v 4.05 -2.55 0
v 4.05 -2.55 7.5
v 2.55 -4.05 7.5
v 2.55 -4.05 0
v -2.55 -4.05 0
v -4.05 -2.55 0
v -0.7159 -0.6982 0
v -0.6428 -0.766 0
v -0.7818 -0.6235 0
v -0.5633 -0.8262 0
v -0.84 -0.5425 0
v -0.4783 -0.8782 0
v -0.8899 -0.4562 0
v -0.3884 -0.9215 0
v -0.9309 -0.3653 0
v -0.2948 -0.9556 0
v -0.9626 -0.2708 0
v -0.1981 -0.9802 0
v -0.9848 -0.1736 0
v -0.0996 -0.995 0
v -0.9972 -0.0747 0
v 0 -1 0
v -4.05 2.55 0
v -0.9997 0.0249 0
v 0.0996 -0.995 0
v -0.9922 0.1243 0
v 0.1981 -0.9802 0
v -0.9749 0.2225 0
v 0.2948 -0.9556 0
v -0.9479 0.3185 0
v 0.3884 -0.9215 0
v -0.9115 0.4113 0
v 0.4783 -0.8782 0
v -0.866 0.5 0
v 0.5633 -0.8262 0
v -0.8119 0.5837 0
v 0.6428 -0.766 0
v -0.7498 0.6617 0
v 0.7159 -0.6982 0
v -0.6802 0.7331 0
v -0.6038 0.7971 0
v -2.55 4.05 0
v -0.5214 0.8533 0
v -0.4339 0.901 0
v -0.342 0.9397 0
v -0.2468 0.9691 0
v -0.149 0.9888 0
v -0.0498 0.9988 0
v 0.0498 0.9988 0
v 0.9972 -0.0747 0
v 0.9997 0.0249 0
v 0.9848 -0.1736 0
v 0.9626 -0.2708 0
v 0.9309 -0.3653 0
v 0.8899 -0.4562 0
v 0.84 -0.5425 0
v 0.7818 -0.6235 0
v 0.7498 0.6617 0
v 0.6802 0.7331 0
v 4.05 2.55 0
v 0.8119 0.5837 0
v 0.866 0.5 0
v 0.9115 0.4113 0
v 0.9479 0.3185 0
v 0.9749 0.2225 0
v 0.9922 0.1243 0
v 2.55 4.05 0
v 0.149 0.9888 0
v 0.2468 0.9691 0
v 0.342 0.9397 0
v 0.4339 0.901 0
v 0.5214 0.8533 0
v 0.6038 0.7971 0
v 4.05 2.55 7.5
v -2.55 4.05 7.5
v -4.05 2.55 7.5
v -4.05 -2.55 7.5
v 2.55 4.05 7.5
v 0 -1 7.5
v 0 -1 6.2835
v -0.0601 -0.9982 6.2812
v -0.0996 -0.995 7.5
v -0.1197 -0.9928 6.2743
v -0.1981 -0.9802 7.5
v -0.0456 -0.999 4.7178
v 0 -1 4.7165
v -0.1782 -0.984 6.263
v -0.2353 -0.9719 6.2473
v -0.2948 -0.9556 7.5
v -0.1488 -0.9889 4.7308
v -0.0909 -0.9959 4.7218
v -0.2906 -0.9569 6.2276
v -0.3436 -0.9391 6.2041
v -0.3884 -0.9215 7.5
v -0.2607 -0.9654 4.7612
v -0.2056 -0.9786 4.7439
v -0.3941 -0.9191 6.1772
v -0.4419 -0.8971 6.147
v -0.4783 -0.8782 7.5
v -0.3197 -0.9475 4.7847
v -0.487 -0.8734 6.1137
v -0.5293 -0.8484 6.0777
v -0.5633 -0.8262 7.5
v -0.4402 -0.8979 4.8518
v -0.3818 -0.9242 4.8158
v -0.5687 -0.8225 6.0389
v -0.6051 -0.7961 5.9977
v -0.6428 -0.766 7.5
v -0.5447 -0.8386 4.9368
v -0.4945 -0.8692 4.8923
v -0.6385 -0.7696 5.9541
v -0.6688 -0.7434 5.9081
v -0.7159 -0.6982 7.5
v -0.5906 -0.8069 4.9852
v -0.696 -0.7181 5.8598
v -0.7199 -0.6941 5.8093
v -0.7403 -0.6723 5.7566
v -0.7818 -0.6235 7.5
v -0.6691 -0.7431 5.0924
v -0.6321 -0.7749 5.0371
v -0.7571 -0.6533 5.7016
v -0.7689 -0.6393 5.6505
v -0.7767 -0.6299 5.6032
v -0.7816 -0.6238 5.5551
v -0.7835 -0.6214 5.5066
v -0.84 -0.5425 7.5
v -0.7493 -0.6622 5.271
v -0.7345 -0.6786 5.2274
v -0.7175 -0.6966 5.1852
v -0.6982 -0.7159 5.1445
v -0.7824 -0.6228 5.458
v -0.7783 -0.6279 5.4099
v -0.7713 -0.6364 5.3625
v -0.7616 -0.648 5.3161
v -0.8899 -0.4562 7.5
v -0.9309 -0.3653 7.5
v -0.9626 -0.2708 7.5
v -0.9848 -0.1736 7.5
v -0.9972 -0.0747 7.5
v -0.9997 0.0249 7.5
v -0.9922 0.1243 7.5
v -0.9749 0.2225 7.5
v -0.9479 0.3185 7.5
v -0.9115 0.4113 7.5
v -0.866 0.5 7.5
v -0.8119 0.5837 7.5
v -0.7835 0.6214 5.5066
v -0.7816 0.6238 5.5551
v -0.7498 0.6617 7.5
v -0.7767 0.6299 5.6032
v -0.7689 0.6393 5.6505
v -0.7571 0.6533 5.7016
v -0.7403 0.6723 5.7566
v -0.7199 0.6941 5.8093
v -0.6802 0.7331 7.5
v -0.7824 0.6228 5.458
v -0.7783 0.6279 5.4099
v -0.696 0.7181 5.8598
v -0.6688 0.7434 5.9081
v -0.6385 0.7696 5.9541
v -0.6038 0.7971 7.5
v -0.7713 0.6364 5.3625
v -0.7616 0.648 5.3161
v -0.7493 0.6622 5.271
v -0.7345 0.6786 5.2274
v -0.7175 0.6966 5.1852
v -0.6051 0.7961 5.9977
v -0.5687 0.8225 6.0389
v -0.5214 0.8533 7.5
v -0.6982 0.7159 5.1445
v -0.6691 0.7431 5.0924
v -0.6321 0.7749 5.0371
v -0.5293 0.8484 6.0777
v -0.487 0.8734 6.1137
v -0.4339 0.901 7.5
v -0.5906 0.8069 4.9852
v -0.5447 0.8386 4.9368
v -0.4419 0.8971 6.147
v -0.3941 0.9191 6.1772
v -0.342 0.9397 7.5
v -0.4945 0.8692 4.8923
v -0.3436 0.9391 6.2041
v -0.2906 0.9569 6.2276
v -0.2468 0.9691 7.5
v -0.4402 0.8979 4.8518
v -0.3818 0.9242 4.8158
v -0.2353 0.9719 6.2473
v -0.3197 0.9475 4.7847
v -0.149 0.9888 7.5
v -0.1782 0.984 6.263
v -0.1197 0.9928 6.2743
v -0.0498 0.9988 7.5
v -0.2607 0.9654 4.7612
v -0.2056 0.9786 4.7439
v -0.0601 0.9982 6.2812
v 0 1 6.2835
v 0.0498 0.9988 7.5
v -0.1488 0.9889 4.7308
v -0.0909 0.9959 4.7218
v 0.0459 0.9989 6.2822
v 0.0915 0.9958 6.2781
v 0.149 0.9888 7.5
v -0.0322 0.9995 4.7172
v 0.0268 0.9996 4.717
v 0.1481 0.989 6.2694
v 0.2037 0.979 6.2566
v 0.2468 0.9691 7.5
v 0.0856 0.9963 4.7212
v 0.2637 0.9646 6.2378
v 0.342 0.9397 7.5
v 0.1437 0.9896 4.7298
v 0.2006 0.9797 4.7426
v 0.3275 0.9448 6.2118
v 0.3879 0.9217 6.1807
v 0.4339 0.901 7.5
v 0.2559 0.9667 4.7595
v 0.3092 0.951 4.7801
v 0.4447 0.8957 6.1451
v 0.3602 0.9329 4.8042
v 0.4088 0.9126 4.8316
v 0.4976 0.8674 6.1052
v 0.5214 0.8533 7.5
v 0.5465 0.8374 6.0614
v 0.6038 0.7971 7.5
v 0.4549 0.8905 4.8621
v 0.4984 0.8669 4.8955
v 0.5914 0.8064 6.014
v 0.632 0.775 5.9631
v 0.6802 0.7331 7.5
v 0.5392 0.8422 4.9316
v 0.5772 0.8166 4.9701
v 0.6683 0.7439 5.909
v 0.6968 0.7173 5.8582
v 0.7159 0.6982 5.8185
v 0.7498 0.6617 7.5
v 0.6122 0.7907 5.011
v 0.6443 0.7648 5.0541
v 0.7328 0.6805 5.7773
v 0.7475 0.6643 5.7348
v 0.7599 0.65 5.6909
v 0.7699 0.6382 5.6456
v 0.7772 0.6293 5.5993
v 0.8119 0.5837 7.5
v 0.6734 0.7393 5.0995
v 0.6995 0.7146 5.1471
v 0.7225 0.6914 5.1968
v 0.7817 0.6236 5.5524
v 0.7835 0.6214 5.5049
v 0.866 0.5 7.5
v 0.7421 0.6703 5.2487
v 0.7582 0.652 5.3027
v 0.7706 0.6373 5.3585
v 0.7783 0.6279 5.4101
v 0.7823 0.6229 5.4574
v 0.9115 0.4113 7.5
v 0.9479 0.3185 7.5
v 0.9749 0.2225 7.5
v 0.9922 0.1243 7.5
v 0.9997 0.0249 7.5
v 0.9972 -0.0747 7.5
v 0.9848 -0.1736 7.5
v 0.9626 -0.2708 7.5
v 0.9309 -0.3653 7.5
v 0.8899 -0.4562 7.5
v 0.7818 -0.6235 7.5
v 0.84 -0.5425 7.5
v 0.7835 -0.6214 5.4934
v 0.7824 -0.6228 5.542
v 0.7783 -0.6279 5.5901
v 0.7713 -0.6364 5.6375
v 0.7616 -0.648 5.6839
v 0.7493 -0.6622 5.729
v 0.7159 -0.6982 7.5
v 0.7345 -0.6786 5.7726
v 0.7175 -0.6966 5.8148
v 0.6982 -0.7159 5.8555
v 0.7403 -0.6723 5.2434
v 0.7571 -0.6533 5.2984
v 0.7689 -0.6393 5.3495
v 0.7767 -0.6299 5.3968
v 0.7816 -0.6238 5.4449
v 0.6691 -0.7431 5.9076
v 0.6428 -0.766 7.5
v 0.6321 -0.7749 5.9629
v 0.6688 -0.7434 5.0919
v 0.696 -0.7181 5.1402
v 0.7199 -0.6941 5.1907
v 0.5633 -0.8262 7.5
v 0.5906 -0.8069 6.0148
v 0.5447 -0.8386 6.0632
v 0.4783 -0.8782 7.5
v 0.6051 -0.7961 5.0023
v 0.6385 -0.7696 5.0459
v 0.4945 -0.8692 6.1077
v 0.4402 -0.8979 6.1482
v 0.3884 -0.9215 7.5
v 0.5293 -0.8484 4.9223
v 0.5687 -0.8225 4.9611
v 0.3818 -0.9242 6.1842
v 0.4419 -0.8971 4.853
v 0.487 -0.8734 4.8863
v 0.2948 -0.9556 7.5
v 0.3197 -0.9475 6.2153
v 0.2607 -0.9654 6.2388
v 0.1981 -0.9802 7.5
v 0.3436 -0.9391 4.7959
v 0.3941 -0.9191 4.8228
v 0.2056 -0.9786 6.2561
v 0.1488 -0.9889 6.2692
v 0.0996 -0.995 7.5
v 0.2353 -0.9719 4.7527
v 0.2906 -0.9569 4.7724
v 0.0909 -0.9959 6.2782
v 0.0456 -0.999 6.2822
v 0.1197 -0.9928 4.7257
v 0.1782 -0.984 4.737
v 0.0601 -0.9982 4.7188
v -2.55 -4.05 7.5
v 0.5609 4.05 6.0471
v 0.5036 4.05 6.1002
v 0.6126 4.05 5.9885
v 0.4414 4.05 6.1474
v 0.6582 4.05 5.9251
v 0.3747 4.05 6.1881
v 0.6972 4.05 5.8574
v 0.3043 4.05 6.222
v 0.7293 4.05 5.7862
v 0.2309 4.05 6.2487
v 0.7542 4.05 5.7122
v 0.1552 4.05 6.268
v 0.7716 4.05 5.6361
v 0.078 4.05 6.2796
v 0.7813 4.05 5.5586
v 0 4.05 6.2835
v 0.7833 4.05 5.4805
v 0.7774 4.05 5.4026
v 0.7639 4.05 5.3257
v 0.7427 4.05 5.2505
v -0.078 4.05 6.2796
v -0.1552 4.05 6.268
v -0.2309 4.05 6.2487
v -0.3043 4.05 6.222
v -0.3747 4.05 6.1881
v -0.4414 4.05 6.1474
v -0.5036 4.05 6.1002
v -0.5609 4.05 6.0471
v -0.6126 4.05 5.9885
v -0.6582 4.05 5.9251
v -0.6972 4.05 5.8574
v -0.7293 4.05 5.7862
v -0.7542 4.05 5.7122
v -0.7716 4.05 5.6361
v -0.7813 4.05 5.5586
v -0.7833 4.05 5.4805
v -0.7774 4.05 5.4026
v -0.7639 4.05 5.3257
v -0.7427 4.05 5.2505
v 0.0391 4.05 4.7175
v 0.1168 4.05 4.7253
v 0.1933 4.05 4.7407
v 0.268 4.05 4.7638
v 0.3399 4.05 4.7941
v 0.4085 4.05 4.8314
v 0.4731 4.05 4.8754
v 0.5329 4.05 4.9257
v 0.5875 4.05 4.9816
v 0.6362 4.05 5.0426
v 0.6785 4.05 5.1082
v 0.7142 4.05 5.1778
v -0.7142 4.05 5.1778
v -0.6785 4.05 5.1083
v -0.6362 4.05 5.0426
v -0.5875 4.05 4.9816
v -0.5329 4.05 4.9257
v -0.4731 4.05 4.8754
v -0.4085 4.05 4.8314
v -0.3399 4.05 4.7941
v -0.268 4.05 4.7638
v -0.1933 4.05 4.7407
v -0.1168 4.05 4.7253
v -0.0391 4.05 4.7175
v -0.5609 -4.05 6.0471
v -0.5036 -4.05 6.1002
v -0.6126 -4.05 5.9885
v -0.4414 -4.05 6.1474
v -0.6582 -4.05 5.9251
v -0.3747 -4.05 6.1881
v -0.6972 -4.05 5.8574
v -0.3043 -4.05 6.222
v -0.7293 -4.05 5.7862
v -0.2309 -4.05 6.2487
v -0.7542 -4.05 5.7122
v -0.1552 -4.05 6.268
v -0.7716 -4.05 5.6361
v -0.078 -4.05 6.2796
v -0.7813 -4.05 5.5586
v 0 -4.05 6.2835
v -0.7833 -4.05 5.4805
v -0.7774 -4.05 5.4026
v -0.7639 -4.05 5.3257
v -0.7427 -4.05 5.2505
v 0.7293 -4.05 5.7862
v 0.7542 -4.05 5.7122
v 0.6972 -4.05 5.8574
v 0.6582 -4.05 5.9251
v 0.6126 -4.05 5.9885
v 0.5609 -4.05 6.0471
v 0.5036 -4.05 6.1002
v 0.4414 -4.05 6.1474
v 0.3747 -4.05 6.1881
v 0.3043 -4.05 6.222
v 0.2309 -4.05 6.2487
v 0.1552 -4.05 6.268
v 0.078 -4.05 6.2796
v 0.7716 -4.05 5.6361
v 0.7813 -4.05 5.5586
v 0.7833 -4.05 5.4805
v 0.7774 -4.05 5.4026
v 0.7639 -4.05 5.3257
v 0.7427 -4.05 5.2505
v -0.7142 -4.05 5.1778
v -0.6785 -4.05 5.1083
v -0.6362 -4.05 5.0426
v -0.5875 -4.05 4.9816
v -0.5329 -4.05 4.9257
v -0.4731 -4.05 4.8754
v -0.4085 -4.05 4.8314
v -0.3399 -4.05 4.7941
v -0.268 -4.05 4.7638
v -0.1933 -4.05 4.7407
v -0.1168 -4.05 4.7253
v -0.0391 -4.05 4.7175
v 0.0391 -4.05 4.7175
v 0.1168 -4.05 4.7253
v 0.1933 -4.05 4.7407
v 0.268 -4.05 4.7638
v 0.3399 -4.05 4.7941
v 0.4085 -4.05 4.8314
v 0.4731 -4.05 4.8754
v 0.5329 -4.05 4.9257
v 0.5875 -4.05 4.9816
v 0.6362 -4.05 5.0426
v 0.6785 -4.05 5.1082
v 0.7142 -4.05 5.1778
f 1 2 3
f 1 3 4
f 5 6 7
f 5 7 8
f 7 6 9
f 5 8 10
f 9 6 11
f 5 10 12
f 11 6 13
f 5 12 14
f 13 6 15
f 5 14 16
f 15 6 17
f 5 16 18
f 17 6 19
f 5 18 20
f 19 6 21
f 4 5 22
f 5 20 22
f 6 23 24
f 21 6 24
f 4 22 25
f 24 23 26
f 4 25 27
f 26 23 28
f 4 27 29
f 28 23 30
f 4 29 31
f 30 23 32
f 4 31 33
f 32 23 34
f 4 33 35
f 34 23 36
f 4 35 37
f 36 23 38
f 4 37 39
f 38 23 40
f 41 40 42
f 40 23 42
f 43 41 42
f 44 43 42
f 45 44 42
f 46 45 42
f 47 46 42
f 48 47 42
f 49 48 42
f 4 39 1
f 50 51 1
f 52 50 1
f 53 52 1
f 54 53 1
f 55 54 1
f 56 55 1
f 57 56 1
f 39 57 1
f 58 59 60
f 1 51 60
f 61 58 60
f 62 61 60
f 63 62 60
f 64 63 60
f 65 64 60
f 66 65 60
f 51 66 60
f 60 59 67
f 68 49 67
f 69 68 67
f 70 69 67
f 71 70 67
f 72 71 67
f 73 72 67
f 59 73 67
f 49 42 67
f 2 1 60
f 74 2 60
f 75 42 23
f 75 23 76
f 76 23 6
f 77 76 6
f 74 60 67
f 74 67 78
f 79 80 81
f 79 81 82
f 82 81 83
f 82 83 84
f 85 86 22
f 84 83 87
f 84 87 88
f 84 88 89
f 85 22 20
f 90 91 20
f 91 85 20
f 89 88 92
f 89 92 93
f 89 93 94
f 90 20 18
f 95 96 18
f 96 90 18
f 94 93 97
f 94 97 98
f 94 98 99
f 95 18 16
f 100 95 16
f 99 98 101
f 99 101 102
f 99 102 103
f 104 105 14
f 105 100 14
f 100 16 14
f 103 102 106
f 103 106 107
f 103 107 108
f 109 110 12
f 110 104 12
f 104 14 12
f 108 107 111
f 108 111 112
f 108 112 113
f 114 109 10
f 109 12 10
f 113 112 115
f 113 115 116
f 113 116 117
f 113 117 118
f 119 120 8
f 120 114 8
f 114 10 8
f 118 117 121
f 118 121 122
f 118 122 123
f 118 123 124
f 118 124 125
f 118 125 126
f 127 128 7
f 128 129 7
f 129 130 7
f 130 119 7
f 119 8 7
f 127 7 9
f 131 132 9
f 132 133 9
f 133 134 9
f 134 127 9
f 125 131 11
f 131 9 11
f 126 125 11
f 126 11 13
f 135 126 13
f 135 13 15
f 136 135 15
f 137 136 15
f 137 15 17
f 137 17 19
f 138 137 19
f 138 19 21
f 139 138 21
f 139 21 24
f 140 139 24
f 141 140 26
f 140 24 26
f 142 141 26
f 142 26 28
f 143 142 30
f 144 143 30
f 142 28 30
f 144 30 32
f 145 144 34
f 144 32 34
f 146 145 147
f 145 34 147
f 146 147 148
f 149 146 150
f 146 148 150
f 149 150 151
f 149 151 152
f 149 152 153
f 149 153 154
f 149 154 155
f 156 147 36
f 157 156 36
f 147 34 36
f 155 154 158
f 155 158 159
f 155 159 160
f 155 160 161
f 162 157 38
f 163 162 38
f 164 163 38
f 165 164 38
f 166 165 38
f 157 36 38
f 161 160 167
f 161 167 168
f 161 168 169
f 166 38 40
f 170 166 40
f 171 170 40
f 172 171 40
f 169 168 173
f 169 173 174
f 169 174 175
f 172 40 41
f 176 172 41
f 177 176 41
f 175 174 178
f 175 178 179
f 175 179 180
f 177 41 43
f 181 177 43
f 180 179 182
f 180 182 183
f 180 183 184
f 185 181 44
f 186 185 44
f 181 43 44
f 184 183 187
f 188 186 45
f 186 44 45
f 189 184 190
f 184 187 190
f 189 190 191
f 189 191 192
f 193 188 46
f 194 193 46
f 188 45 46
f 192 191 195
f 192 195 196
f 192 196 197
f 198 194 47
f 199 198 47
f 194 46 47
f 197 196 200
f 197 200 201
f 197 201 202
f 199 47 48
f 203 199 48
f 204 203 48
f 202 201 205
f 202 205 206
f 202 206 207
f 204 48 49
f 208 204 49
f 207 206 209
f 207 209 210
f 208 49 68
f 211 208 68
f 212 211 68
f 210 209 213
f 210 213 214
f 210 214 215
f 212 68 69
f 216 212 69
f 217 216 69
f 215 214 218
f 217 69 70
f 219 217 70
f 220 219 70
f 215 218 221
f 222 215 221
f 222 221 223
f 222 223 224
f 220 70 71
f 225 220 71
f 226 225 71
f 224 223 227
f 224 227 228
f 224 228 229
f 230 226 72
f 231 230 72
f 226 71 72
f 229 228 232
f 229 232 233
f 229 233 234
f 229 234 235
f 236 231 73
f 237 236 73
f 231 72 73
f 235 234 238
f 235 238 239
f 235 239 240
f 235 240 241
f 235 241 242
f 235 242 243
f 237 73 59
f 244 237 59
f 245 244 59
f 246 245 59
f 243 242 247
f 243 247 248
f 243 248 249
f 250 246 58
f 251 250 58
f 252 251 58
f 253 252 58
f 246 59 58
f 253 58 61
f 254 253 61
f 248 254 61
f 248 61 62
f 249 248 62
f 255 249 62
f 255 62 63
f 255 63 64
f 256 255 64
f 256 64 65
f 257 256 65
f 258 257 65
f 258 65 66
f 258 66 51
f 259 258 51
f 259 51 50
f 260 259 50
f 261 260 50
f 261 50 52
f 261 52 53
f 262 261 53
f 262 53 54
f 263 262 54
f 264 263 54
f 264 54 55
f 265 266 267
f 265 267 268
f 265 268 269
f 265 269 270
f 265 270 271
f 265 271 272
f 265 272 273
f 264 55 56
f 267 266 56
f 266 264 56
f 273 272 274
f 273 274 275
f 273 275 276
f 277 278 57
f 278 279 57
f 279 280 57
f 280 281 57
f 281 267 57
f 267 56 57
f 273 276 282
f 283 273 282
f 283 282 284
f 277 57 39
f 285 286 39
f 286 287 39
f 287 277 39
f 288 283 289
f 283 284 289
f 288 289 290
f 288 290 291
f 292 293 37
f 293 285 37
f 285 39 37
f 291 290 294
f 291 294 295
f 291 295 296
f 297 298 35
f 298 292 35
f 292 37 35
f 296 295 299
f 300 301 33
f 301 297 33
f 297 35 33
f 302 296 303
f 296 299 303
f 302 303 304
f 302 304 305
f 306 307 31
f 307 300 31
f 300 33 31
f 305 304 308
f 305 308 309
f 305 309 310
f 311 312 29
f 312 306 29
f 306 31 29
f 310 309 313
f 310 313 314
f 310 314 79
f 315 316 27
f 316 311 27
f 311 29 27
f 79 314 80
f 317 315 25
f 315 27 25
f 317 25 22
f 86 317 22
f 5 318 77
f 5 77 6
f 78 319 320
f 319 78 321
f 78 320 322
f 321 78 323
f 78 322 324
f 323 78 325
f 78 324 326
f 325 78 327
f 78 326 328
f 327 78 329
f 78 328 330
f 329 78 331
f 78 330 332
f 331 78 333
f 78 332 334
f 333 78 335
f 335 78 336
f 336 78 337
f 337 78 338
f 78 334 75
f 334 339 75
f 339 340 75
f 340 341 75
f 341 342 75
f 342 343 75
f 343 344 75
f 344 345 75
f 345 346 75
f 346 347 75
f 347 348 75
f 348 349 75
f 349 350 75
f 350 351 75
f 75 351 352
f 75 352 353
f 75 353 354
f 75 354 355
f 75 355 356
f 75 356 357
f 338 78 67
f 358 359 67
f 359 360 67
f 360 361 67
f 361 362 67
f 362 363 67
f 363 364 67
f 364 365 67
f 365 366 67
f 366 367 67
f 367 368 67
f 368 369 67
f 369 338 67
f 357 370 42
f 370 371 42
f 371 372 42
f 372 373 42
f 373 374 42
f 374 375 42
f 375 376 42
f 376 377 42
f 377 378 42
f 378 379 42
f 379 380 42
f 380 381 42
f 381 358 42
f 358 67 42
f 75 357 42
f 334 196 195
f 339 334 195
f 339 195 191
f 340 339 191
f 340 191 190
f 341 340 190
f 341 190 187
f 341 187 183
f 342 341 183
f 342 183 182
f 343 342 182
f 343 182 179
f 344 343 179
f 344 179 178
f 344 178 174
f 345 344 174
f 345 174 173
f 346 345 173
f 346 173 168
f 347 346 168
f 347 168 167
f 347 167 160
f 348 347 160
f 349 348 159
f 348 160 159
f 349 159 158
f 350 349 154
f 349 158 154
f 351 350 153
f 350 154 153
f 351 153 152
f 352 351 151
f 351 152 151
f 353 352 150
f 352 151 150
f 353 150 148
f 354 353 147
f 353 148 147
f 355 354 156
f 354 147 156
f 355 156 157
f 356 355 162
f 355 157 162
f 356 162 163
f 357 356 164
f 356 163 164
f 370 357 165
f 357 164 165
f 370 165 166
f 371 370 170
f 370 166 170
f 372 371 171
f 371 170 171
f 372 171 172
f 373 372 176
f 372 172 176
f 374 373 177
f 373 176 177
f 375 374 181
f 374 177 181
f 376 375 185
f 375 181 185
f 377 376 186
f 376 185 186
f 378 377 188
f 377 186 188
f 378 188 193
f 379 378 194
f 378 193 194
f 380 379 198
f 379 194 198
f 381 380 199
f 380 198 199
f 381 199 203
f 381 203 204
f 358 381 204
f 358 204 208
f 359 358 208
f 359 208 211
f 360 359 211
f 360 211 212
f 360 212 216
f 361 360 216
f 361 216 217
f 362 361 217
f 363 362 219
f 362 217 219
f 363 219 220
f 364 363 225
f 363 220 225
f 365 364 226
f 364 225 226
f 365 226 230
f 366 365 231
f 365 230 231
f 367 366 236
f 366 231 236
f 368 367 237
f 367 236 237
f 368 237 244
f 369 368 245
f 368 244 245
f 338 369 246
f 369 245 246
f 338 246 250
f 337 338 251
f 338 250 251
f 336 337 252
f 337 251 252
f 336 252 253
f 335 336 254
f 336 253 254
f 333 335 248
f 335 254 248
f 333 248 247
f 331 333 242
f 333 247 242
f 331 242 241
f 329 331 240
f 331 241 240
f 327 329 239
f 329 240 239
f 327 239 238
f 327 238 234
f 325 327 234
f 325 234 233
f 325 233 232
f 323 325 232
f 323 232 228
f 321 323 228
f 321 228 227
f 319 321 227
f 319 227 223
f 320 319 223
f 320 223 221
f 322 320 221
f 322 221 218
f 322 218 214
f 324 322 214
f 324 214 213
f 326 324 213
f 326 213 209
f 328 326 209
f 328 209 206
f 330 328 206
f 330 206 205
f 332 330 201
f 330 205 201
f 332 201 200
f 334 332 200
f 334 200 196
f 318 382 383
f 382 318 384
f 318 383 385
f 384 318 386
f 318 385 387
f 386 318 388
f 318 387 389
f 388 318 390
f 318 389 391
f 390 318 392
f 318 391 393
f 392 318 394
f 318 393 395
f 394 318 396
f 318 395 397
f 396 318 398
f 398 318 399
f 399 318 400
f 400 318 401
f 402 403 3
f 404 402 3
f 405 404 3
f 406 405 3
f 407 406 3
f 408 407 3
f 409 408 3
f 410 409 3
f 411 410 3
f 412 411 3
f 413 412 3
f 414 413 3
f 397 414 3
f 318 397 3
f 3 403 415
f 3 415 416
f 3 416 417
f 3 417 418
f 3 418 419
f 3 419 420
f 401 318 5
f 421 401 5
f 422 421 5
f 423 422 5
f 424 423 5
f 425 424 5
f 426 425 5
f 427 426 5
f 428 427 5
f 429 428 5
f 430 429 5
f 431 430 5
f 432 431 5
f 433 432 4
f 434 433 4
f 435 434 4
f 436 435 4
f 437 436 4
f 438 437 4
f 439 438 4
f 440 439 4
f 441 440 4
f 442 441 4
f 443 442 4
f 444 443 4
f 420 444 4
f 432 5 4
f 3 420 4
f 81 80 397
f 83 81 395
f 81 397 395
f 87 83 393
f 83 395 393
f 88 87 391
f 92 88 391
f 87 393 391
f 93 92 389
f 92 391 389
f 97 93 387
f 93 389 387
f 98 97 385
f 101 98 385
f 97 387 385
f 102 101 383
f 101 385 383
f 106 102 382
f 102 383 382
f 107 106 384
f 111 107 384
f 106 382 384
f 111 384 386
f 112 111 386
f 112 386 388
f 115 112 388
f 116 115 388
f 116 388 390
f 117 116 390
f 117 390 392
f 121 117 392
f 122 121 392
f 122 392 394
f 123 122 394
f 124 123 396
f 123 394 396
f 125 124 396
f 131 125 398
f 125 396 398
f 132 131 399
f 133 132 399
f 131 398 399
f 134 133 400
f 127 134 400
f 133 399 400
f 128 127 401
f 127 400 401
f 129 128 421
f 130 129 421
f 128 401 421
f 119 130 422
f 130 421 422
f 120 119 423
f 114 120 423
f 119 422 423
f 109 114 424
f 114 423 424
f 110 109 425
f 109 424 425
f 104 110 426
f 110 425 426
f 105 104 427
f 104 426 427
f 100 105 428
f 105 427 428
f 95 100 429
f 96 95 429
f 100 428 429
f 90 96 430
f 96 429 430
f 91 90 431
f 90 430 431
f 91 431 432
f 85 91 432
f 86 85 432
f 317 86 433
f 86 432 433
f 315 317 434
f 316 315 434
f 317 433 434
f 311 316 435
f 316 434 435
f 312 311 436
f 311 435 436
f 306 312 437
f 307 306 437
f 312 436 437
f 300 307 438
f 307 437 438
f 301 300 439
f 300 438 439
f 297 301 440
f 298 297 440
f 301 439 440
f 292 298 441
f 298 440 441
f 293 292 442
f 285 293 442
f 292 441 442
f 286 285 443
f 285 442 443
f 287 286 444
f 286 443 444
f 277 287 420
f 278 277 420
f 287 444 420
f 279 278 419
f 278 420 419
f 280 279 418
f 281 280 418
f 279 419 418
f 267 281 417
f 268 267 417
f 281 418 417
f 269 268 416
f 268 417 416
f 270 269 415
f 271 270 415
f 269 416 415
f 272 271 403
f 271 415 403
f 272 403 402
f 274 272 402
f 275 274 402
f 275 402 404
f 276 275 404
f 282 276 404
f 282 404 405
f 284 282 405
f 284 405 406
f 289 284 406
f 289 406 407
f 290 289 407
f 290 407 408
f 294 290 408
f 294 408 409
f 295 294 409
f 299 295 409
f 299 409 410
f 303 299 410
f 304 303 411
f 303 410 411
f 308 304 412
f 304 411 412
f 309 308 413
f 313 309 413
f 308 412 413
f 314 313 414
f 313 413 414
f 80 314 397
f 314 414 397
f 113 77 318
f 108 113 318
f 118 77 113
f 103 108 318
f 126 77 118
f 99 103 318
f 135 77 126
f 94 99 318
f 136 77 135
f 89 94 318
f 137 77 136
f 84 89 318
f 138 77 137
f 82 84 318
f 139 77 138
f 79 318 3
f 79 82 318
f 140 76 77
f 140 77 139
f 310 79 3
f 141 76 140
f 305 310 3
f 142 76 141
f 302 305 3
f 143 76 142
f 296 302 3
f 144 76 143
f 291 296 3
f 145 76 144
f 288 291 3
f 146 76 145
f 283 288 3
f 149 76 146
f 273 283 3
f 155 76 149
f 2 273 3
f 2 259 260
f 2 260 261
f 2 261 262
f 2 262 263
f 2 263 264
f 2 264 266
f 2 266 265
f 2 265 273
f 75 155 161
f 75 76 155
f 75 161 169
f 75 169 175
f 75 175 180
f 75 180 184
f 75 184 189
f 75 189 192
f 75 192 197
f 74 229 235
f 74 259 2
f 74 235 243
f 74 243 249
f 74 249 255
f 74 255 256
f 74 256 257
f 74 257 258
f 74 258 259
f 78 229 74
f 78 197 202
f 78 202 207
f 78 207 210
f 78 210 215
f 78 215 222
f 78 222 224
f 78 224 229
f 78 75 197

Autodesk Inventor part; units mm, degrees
ref_plane "YZ Plane" through (0, 0, 0) normal (1, 0, 0) x (0, 1, 0)
ref_plane "XZ Plane" through (0, 0, 0) normal (0, 1, 0) x (-1, 0, 0)
ref_plane "XY Plane" through (0, 0, 0) normal (0, 0, 1) x (1, 0, 0)
sketch "Skizze1" plane through (0, 0, 0) normal (0, 0, 1) x (1, 0, 0)
  line L0 (-4.05, -4.05) -> (4.05, -4.05)
  line L1 (4.05, -4.05) -> (4.05, 4.05)
  line L2 (4.05, 4.05) -> (-4.05, 4.05)
  line L3 (-4.05, 4.05) -> (-4.05, -4.05)
  line L4 (-4.05, -4.05) -> (4.05, 4.05) construction
  line L5 (4.05, -4.05) -> (-4.05, 4.05) construction
  point P0 (0, 0)
  dimension "d0" = 8.1
extrude "Extrusion1" add sketch "Skizze1" along normal blind 7.5
sketch "Skizze3" plane through (0, 0, 7.5) normal (0, 0, 1) x (1, 0, 0)
  point P0 (0, 0)
  point P1 (0, 0)
hole "Bohrung1" at (0, 0, 7.5) direction (0, 0, -1) diameter 2 end through all
sketch "Skizze4" plane through (-4.05, 4.05, 0) normal (0, 1, 0) x (1, 0, 0)
  line L0 (8.1, 0) -> (0, 0) construction
  line L1 (0, 0) -> (0, -7.5) construction
  line L2 (8.1, -7.5) -> (0, -7.5) construction
  line L3 (8.1, 0) -> (8.1, -7.5) construction
  line L4 (8.1, -7.5) -> (0, -7.5) projected
  line L5 (4.05, -7.5) -> (4.05, 0) construction
  point P0 (4.05, -5.5)
  dimension "d11" = 2
hole "Bohrung2" at (0, 4.05, 5.5) direction (0, -1, 0) diameter 1.567 end through all thread size "M2x0.4" class "6H" standard "ISO Metric profile"
chamfer "Fase1" distance 1.5 angle 45 4 edges at (-4.05, 4.05, 3.75) (4.05, 4.05, 3.75) (-4.05, -4.05, 3.75) (4.05, -4.05, 3.75)
properties part number "Drehmomentuebertraeger_V4_1" material "Aluminium 6061"
